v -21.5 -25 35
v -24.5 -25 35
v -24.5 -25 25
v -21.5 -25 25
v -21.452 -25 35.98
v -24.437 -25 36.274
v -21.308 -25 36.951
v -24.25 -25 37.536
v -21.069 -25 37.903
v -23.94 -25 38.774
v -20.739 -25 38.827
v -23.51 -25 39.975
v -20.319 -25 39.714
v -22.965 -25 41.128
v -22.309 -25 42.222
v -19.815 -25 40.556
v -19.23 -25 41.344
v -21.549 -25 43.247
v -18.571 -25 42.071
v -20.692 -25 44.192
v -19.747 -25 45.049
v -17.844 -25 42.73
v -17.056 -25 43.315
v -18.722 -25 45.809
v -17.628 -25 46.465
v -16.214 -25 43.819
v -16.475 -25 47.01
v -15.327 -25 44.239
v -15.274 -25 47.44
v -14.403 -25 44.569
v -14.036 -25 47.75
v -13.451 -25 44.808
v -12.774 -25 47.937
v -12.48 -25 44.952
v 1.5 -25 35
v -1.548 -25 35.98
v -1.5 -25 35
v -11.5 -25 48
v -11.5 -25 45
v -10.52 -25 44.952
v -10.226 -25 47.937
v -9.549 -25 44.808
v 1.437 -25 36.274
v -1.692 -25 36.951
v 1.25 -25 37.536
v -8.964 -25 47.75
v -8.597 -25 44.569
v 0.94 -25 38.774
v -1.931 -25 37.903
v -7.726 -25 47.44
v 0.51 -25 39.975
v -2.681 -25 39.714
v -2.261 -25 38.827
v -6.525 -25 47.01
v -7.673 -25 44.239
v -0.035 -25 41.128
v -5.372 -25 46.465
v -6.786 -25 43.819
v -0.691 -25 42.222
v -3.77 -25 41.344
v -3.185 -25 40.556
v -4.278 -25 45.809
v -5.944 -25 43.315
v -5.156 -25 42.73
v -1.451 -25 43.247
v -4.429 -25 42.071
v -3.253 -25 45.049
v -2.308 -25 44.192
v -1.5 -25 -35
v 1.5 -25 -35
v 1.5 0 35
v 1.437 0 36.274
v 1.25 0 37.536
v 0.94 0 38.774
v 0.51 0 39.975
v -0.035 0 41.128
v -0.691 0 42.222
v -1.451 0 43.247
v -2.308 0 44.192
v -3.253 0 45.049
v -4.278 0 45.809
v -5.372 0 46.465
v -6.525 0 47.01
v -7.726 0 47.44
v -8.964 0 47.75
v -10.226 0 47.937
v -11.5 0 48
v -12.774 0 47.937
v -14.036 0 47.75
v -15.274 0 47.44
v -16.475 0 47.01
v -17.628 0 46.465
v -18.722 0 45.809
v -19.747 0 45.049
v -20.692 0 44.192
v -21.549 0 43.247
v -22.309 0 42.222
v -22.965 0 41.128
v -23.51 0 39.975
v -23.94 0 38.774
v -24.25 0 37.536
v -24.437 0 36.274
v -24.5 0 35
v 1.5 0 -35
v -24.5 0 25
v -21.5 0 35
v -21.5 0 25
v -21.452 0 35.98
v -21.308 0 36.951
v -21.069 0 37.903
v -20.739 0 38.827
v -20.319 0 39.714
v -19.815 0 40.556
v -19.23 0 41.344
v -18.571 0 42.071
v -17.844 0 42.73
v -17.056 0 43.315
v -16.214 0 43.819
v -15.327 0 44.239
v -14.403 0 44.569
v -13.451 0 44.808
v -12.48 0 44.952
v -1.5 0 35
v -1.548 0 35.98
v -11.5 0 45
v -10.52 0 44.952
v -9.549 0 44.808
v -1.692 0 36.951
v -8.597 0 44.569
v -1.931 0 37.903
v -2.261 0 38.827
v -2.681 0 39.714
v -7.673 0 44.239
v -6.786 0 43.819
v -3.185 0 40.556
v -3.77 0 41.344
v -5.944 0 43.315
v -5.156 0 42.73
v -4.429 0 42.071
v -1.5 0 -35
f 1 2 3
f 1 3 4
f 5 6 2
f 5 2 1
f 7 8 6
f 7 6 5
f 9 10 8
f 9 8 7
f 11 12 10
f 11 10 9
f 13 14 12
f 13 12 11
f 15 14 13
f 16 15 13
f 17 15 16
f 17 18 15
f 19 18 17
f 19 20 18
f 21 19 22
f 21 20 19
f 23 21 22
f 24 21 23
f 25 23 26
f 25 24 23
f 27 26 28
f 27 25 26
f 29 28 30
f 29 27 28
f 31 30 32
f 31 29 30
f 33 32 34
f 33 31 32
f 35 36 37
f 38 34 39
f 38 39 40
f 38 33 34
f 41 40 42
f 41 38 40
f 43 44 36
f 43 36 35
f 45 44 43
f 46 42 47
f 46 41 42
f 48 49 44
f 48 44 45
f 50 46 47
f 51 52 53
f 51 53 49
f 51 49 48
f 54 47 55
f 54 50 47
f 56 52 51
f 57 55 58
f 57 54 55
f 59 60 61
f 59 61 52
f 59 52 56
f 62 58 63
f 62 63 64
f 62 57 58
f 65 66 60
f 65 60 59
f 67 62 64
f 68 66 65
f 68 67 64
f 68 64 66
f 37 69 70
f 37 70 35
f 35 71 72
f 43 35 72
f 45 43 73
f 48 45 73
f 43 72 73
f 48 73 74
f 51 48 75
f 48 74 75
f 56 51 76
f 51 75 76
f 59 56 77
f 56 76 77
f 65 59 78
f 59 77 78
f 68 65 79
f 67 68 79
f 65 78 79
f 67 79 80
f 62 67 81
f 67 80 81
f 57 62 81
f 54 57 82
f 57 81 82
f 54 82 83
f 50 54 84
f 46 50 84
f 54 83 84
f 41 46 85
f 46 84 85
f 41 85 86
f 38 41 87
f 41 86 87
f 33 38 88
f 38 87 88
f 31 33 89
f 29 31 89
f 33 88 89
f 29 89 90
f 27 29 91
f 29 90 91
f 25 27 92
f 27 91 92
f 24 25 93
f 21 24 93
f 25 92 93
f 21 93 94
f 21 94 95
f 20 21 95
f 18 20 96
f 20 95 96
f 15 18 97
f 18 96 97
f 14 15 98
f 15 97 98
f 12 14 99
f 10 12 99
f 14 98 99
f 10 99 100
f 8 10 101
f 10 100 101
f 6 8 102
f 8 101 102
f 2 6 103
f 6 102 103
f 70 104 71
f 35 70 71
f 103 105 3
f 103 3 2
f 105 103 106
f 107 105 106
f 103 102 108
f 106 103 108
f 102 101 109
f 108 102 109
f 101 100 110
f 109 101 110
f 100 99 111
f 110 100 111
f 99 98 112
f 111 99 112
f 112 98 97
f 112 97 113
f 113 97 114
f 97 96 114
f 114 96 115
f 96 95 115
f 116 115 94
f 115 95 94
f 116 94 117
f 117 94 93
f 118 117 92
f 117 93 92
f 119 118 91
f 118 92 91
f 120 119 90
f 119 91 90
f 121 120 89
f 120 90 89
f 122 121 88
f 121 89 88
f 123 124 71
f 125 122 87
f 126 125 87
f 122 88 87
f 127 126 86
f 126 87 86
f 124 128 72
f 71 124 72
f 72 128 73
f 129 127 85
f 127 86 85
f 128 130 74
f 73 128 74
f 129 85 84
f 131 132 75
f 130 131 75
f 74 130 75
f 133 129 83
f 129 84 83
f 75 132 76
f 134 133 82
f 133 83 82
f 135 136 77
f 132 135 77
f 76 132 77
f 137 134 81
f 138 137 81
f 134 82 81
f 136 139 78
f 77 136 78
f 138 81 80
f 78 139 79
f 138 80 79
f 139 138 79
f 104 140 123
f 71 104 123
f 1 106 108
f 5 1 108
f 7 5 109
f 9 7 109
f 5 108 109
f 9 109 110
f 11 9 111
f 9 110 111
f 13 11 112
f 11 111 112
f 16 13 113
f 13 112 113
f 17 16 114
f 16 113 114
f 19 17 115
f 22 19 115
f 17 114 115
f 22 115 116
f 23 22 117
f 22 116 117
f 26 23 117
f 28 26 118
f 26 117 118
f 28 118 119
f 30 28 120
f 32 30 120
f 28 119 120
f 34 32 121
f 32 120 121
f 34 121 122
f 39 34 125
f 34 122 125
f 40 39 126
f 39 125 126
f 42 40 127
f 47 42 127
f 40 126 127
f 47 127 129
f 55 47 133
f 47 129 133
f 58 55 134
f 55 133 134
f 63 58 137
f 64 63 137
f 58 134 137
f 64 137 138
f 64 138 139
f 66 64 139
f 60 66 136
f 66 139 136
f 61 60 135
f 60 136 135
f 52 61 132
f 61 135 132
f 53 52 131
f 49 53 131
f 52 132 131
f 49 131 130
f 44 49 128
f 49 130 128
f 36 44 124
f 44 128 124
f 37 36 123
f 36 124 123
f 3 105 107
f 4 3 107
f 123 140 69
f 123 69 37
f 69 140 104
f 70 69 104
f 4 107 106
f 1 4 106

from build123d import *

# Parameters (mm, degrees)
F0_W     = 3
F0_H     = 70
F0_H_2   = 10
F1_DEPTH = 25


with BuildPart() as f1:
    # F0 (on Front) → F1 (new body)
    with BuildSketch(Plane.XZ):
        with BuildLine():
            ThreePointArc((-21.5, 35), (-11.5, 45), (-1.5, 35))
            Line((-1.5, 35), (1.5, 35))
            ThreePointArc((1.5, 35), (-11.5, 48), (-24.5, 35))
            Line((-24.5, 35), (-21.5, 35))
        make_face()
        Rectangle(F0_W, F0_H)
        with Locations((-23, 30)):
            Rectangle(F0_W, F0_H_2)
    extrude(amount=F1_DEPTH)


solid = f1.part
